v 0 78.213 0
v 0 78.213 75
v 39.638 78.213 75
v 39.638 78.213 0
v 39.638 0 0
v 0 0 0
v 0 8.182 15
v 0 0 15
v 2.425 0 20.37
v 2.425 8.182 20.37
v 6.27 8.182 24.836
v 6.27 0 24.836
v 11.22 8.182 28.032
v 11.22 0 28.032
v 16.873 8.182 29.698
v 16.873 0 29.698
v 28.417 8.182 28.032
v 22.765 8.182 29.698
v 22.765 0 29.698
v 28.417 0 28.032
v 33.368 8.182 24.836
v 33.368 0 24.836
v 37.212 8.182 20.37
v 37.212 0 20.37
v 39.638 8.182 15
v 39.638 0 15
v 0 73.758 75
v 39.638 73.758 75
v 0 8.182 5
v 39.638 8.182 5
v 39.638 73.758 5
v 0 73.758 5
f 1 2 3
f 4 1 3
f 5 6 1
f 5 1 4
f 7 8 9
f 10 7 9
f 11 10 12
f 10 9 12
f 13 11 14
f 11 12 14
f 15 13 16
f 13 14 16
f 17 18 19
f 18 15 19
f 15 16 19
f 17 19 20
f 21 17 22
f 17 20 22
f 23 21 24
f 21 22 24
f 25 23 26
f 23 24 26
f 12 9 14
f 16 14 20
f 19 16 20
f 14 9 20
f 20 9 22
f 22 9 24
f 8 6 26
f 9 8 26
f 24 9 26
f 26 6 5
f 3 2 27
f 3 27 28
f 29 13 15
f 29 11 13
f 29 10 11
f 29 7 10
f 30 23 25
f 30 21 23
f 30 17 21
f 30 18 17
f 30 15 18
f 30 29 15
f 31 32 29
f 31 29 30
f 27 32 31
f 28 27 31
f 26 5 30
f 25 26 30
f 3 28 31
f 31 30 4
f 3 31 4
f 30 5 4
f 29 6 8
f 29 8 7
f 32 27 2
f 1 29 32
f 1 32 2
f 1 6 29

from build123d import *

# Parameters (mm, degrees)
F0_W     = 39.6377146244
F0_H     = 78.2129243016
F1_DEPTH = 5
F2_W     = 39.6377146244
F2_H     = 4.4546872377
F3_DEPTH = 70
F4_W     = 39.6377146244
F4_H     = 8.1823468208
F5_DEPTH = 25
F7_DEPTH = 25


with BuildPart() as f1:
    # F0 (on Top) → F1 (new body)
    with BuildSketch(Plane.XY):
        with Locations((19.8188573122, 39.1064621508)):
            Rectangle(F0_W, F0_H)
    extrude(amount=F1_DEPTH)

    # F2 (on face) → F3 (join)
    with BuildSketch(Plane.XY.offset(5)):
        with Locations((19.8188573122, 75.9855806828)):
            Rectangle(F2_W, F2_H)
    extrude(amount=F3_DEPTH)

    # F4 (on face) → F5 (join)
    with BuildSketch(Plane.XY.offset(5)):
        with Locations((19.8188573122, 4.0911734104)):
            Rectangle(F4_W, F4_H)
    extrude(amount=F5_DEPTH)

    # F6 (on face) → F7 (cut)
    with BuildSketch(Plane.XZ):
        with BuildLine():
            ThreePointArc((0, 15), (19.8188573122, 29.9098357825), (39.6377146244, 15))
            Line((39.6377146244, 15), (39.6377146244, 30))
            Line((39.6377146244, 30), (0, 30))
            Line((0, 30), (0, 15))
        make_face()
    extrude(amount=-F7_DEPTH, mode=Mode.SUBTRACT)


solid = f1.part
